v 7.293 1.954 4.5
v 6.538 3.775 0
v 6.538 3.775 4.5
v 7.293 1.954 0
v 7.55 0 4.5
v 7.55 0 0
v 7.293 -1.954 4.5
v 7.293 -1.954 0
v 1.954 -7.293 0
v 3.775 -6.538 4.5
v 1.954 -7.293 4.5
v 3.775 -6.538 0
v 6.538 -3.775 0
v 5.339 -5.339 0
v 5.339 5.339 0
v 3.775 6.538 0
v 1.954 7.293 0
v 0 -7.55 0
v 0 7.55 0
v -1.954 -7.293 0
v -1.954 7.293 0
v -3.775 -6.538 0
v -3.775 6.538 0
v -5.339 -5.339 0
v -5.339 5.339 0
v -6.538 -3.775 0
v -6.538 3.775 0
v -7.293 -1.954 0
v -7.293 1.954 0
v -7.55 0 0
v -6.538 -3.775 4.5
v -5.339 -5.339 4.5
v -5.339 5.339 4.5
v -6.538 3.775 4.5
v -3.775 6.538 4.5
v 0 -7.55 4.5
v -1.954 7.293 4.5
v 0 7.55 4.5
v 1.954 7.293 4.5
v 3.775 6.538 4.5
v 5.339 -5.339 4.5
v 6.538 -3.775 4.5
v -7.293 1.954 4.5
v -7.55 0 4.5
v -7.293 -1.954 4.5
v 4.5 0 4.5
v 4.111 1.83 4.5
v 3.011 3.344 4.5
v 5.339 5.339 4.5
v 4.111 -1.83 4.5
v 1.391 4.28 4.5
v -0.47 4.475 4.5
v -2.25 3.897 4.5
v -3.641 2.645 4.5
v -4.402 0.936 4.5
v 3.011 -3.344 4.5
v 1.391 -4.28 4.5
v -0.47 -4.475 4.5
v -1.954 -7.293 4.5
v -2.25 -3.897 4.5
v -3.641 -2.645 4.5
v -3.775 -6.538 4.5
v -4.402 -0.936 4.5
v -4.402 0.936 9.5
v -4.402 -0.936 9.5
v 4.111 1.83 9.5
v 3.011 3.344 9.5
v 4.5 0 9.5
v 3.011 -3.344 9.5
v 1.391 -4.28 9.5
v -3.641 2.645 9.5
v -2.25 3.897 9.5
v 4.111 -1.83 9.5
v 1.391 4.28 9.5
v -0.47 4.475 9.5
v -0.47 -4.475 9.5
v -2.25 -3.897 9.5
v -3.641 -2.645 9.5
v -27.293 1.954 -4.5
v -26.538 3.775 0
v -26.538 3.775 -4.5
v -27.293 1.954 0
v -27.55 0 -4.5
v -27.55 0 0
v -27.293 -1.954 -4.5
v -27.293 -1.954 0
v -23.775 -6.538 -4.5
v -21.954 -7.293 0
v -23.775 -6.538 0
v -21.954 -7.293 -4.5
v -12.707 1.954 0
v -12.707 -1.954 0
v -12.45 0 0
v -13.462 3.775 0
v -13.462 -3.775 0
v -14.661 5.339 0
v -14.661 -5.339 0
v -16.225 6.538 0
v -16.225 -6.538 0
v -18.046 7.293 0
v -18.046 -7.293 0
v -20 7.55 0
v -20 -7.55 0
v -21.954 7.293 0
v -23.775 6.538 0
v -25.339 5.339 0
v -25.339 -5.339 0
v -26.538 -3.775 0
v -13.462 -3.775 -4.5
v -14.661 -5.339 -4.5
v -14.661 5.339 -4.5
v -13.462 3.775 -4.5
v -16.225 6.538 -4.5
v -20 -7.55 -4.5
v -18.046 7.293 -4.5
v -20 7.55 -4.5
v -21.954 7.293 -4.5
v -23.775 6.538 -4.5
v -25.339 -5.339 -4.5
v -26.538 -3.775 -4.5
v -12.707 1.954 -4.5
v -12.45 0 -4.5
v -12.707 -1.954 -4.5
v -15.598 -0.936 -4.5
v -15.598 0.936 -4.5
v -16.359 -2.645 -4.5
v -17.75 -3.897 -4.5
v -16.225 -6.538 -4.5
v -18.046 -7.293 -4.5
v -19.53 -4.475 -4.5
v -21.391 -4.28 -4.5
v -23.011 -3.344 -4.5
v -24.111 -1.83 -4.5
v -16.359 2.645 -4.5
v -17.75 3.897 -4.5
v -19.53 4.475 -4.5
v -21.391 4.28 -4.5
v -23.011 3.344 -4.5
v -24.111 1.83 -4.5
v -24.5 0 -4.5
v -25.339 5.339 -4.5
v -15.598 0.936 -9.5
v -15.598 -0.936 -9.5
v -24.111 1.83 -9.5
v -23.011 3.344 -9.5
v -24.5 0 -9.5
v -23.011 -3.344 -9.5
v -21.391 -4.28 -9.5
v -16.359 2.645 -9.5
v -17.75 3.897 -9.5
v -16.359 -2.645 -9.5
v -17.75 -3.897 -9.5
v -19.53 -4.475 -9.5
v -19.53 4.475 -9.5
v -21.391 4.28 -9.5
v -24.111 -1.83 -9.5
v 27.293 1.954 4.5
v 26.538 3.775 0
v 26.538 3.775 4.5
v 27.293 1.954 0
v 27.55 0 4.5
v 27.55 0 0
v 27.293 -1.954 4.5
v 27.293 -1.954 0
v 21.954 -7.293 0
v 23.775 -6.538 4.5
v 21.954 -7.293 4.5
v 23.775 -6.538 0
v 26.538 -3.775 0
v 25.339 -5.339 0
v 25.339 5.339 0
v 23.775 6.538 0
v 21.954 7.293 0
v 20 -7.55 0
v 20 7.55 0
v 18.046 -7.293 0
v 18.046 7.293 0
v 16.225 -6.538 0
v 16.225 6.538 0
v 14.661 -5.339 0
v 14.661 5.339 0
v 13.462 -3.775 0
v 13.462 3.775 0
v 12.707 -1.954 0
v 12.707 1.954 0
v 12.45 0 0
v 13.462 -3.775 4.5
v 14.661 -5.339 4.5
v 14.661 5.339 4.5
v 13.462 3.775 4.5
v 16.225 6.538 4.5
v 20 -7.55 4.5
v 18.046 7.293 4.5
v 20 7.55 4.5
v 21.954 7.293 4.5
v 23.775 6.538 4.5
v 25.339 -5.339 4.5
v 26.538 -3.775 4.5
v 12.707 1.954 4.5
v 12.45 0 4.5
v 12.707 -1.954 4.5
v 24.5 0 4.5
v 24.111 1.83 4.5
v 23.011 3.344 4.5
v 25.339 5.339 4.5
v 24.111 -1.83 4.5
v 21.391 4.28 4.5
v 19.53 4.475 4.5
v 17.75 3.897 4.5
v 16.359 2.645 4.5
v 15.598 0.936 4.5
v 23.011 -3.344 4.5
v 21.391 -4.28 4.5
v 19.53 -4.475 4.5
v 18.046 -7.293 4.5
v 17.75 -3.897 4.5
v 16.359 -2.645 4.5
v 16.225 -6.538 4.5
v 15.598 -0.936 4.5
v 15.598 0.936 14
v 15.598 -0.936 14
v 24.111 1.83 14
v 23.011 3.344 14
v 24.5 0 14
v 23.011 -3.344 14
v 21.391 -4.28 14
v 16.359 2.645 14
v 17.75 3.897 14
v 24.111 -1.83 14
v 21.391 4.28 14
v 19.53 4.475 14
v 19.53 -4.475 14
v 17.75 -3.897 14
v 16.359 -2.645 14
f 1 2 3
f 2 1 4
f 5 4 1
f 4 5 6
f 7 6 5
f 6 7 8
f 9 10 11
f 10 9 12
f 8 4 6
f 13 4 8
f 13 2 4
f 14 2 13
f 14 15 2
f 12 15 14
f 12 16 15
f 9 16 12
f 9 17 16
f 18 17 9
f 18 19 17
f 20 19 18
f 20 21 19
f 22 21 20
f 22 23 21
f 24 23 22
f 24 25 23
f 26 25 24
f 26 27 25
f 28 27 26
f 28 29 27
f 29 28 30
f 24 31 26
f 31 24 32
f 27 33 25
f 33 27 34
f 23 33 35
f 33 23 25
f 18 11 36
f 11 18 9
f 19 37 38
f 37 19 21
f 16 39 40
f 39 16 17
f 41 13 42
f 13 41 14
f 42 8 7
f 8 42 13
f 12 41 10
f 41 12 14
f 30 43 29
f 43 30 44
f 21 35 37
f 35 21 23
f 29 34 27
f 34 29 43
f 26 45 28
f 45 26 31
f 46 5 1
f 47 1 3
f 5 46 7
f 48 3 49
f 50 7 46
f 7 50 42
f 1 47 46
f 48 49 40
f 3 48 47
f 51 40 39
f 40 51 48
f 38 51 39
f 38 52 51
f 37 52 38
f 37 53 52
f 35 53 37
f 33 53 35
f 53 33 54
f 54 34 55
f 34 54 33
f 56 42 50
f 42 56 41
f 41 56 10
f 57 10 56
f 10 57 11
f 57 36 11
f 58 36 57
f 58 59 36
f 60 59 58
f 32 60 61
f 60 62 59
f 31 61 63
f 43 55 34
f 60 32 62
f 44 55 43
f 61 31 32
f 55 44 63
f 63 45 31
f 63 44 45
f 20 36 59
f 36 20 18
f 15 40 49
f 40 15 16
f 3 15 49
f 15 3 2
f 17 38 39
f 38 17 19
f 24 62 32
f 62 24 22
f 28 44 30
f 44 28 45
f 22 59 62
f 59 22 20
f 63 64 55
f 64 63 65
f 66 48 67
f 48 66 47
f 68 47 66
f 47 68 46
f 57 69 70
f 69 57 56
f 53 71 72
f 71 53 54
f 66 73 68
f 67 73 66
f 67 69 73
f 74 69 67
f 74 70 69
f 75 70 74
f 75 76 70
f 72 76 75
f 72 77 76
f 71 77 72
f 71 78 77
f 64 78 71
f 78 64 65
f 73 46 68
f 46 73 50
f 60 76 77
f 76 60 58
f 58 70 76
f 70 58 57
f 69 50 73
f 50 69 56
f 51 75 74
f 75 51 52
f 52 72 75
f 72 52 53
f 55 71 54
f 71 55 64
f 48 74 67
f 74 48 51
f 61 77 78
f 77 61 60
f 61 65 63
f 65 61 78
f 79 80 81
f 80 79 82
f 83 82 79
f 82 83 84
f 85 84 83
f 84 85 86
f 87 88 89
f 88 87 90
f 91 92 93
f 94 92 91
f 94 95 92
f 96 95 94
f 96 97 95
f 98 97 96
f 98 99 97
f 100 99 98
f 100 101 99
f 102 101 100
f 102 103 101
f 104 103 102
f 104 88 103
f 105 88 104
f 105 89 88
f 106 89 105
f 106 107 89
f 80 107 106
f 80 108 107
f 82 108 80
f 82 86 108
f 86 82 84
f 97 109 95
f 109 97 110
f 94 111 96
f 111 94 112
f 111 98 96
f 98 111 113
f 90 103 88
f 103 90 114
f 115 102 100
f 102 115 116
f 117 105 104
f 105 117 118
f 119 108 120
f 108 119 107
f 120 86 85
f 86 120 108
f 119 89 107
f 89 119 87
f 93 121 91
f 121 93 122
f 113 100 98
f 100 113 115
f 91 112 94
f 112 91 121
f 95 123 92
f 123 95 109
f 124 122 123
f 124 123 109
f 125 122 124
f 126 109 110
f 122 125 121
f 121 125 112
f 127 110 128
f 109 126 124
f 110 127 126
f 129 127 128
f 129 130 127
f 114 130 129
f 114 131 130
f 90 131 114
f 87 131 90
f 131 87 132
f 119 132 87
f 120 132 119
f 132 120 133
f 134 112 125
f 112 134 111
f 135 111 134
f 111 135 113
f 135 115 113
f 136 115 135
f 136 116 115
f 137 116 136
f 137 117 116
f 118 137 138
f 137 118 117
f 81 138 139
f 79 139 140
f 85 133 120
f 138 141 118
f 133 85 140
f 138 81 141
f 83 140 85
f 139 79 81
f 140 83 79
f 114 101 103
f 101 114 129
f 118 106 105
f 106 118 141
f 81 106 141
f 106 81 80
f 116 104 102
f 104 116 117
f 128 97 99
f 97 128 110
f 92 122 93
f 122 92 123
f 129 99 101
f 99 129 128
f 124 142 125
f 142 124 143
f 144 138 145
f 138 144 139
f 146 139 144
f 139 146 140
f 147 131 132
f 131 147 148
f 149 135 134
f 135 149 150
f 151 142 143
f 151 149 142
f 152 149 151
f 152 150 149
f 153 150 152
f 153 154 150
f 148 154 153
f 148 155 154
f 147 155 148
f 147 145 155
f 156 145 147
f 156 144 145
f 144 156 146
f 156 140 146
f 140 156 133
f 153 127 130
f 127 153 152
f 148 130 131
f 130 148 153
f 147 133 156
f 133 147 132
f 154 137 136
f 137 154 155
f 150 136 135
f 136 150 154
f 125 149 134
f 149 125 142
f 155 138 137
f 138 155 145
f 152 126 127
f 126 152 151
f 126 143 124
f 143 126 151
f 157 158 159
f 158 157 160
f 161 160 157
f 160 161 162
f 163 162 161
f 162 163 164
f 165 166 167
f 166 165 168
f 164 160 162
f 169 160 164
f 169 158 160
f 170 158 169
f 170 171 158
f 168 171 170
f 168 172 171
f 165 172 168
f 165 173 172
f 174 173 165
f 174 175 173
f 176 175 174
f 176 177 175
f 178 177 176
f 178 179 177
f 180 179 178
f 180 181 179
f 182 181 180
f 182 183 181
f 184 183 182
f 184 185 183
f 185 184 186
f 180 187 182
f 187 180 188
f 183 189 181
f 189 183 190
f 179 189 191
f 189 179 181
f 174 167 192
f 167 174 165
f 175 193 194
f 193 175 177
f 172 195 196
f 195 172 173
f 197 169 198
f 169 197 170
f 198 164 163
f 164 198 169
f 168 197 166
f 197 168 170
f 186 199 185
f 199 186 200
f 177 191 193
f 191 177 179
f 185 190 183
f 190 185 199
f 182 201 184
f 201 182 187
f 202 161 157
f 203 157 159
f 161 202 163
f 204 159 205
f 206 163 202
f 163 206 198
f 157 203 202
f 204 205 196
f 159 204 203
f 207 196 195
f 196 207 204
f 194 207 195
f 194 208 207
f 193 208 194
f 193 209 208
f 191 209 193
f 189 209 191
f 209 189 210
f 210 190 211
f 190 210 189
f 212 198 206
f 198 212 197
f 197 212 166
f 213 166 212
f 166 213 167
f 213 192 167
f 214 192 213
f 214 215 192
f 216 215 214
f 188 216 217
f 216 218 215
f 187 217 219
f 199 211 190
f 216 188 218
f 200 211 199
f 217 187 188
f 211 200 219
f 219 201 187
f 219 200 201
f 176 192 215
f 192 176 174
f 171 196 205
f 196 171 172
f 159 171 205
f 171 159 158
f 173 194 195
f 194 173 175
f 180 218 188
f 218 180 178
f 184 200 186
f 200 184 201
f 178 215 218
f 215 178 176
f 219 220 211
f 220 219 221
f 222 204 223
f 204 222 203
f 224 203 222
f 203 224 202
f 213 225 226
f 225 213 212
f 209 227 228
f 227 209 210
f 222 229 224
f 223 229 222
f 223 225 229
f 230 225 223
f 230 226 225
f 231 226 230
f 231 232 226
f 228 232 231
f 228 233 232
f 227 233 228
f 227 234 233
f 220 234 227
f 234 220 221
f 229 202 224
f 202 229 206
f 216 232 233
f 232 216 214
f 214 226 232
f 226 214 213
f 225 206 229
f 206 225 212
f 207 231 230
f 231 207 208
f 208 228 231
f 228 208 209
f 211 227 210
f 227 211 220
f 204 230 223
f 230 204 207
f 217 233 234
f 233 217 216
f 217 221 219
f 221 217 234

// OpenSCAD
// =====================================================
// CALCULADORA SIMPLIFICADA DE AVELLANADO
// Para tornillos de madera - Versión cilindro recto
// =====================================================

// Función que calcula el diámetro de cabeza y altura 
// según el diámetro de la rosca (D) en mm
function cabeza_tornillo(D) = 
    D <= 3 ? [5.6, 1.65] :    // [DK, K] para M3
    D <= 4 ? [7.5, 2.2] :     // M4
    D <= 5 ? [9.2, 2.5] :     // M5
    D <= 6 ? [11.0, 3.0] :    // M6
    D <= 8 ? [14.5, 4.0] :    // M8
    D <= 10 ? [18.0, 5.0] :   // M10
    D <= 12 ? [22.0, 6.0] :   // M12
    D <= 14 ? [26.0, 7.0] :   // M14
    D <= 16 ? [30.0, 8.0] :   // M16
    [D * 1.8, D * 0.5];       // Fórmula general

// =====================================================
// MÓDULO SIMPLIFICADO - CILINDRO RECTO
// =====================================================
module avellanado_cilindrico(
    diametro_rosca,          // Diámetro del tornillo en mm
    profundidad_avellano,    // Profundidad del avellanado en mm
    holgura = 0.3            // Holgura para el diámetro
) {
    // Obtener dimensiones de la cabeza
    datos = cabeza_tornillo(diametro_rosca);
    diametro_cabeza = datos[0];
    
    // Crear el cilindro del avellanado
    translate([0, 0, 0]) 
        cylinder(h = profundidad_avellano, 
                 r = (diametro_cabeza/2) + holgura);
}

// =====================================================
// MÓDULO PARA AGUJERO PASANTE (solo diámetro)
// =====================================================
module agujero_pasante(
    diametro_rosca,          // Diámetro del tornillo en mm
    profundidad,       // Profundidad total del agujero (grosor de la pieza)
    profundidad_avellano=0,// suma del hueco de avellanado
    holgura = 0.5,            // Holgura para el diámetro
    profundidad_abs=true
) {
  if(profundidad_abs)
   translate([0, 0, profundidad_avellano]) 
        cylinder(h = profundidad -profundidad_avellano , 
                 r = (diametro_rosca/2) + holgura);
  
   else
    // Crear agujero cilíndrico pasante
    translate([0, 0, profundidad_avellano]) 
        cylinder(h = profundidad, 
                 r = (diametro_rosca/2) + holgura);
  
}

// =====================================================
// MÓDULO COMBINADO - AVELLANADO + AGUJERO PASANTE
// =====================================================
module agujero_con_avellanado(
    diametro_rosca,          // Diámetro del tornillo en mm
    profundidad_avellano,    // Profundidad del avellanado en mm
    profundidad_pieza,       // Grosor total de la pieza en mm
    holgura_avellano = 0.3,  // Holgura para el avellanado
    holgura_pasante = 0.5,    // Holgura para el agujero pasante
    profundidad_abs=true,
) {
    // Avellanado (cilindro recto)
   avellanado_cilindrico(
        diametro_rosca = diametro_rosca,
        profundidad_avellano = profundidad_avellano,
        holgura = holgura_avellano
    );
  
    // Agujero pasante (desde el fondo del avellanado hasta el final)
        agujero_pasante(
            diametro_rosca = diametro_rosca,
            profundidad = profundidad_pieza ,
            profundidad_avellano= profundidad_avellano,
            holgura = holgura_pasante,
            profundidad_abs=profundidad_abs
        );
}


// =====================================================
// FUNCIONES DE UTILIDAD
// =====================================================

// Función para obtener solo el diámetro de cabeza
function diametro_cabeza(D) = cabeza_tornillo(D)[0];

// Función para obtener solo la altura de cabeza
function altura_cabeza(D) = cabeza_tornillo(D)[1];

// =====================================================
// VISUALIZACIÓN DE EJEMPLOS
// =====================================================
translate([-20, 0, 0])
rotate([0.,180,0]){
agujero_con_avellanado(8, 4.5, 9.5);
 }
agujero_con_avellanado(8, 4.5, 9.5);

translate([20, 0, 0])
agujero_con_avellanado(8, 4.5, 9.5,profundidad_abs=false);
